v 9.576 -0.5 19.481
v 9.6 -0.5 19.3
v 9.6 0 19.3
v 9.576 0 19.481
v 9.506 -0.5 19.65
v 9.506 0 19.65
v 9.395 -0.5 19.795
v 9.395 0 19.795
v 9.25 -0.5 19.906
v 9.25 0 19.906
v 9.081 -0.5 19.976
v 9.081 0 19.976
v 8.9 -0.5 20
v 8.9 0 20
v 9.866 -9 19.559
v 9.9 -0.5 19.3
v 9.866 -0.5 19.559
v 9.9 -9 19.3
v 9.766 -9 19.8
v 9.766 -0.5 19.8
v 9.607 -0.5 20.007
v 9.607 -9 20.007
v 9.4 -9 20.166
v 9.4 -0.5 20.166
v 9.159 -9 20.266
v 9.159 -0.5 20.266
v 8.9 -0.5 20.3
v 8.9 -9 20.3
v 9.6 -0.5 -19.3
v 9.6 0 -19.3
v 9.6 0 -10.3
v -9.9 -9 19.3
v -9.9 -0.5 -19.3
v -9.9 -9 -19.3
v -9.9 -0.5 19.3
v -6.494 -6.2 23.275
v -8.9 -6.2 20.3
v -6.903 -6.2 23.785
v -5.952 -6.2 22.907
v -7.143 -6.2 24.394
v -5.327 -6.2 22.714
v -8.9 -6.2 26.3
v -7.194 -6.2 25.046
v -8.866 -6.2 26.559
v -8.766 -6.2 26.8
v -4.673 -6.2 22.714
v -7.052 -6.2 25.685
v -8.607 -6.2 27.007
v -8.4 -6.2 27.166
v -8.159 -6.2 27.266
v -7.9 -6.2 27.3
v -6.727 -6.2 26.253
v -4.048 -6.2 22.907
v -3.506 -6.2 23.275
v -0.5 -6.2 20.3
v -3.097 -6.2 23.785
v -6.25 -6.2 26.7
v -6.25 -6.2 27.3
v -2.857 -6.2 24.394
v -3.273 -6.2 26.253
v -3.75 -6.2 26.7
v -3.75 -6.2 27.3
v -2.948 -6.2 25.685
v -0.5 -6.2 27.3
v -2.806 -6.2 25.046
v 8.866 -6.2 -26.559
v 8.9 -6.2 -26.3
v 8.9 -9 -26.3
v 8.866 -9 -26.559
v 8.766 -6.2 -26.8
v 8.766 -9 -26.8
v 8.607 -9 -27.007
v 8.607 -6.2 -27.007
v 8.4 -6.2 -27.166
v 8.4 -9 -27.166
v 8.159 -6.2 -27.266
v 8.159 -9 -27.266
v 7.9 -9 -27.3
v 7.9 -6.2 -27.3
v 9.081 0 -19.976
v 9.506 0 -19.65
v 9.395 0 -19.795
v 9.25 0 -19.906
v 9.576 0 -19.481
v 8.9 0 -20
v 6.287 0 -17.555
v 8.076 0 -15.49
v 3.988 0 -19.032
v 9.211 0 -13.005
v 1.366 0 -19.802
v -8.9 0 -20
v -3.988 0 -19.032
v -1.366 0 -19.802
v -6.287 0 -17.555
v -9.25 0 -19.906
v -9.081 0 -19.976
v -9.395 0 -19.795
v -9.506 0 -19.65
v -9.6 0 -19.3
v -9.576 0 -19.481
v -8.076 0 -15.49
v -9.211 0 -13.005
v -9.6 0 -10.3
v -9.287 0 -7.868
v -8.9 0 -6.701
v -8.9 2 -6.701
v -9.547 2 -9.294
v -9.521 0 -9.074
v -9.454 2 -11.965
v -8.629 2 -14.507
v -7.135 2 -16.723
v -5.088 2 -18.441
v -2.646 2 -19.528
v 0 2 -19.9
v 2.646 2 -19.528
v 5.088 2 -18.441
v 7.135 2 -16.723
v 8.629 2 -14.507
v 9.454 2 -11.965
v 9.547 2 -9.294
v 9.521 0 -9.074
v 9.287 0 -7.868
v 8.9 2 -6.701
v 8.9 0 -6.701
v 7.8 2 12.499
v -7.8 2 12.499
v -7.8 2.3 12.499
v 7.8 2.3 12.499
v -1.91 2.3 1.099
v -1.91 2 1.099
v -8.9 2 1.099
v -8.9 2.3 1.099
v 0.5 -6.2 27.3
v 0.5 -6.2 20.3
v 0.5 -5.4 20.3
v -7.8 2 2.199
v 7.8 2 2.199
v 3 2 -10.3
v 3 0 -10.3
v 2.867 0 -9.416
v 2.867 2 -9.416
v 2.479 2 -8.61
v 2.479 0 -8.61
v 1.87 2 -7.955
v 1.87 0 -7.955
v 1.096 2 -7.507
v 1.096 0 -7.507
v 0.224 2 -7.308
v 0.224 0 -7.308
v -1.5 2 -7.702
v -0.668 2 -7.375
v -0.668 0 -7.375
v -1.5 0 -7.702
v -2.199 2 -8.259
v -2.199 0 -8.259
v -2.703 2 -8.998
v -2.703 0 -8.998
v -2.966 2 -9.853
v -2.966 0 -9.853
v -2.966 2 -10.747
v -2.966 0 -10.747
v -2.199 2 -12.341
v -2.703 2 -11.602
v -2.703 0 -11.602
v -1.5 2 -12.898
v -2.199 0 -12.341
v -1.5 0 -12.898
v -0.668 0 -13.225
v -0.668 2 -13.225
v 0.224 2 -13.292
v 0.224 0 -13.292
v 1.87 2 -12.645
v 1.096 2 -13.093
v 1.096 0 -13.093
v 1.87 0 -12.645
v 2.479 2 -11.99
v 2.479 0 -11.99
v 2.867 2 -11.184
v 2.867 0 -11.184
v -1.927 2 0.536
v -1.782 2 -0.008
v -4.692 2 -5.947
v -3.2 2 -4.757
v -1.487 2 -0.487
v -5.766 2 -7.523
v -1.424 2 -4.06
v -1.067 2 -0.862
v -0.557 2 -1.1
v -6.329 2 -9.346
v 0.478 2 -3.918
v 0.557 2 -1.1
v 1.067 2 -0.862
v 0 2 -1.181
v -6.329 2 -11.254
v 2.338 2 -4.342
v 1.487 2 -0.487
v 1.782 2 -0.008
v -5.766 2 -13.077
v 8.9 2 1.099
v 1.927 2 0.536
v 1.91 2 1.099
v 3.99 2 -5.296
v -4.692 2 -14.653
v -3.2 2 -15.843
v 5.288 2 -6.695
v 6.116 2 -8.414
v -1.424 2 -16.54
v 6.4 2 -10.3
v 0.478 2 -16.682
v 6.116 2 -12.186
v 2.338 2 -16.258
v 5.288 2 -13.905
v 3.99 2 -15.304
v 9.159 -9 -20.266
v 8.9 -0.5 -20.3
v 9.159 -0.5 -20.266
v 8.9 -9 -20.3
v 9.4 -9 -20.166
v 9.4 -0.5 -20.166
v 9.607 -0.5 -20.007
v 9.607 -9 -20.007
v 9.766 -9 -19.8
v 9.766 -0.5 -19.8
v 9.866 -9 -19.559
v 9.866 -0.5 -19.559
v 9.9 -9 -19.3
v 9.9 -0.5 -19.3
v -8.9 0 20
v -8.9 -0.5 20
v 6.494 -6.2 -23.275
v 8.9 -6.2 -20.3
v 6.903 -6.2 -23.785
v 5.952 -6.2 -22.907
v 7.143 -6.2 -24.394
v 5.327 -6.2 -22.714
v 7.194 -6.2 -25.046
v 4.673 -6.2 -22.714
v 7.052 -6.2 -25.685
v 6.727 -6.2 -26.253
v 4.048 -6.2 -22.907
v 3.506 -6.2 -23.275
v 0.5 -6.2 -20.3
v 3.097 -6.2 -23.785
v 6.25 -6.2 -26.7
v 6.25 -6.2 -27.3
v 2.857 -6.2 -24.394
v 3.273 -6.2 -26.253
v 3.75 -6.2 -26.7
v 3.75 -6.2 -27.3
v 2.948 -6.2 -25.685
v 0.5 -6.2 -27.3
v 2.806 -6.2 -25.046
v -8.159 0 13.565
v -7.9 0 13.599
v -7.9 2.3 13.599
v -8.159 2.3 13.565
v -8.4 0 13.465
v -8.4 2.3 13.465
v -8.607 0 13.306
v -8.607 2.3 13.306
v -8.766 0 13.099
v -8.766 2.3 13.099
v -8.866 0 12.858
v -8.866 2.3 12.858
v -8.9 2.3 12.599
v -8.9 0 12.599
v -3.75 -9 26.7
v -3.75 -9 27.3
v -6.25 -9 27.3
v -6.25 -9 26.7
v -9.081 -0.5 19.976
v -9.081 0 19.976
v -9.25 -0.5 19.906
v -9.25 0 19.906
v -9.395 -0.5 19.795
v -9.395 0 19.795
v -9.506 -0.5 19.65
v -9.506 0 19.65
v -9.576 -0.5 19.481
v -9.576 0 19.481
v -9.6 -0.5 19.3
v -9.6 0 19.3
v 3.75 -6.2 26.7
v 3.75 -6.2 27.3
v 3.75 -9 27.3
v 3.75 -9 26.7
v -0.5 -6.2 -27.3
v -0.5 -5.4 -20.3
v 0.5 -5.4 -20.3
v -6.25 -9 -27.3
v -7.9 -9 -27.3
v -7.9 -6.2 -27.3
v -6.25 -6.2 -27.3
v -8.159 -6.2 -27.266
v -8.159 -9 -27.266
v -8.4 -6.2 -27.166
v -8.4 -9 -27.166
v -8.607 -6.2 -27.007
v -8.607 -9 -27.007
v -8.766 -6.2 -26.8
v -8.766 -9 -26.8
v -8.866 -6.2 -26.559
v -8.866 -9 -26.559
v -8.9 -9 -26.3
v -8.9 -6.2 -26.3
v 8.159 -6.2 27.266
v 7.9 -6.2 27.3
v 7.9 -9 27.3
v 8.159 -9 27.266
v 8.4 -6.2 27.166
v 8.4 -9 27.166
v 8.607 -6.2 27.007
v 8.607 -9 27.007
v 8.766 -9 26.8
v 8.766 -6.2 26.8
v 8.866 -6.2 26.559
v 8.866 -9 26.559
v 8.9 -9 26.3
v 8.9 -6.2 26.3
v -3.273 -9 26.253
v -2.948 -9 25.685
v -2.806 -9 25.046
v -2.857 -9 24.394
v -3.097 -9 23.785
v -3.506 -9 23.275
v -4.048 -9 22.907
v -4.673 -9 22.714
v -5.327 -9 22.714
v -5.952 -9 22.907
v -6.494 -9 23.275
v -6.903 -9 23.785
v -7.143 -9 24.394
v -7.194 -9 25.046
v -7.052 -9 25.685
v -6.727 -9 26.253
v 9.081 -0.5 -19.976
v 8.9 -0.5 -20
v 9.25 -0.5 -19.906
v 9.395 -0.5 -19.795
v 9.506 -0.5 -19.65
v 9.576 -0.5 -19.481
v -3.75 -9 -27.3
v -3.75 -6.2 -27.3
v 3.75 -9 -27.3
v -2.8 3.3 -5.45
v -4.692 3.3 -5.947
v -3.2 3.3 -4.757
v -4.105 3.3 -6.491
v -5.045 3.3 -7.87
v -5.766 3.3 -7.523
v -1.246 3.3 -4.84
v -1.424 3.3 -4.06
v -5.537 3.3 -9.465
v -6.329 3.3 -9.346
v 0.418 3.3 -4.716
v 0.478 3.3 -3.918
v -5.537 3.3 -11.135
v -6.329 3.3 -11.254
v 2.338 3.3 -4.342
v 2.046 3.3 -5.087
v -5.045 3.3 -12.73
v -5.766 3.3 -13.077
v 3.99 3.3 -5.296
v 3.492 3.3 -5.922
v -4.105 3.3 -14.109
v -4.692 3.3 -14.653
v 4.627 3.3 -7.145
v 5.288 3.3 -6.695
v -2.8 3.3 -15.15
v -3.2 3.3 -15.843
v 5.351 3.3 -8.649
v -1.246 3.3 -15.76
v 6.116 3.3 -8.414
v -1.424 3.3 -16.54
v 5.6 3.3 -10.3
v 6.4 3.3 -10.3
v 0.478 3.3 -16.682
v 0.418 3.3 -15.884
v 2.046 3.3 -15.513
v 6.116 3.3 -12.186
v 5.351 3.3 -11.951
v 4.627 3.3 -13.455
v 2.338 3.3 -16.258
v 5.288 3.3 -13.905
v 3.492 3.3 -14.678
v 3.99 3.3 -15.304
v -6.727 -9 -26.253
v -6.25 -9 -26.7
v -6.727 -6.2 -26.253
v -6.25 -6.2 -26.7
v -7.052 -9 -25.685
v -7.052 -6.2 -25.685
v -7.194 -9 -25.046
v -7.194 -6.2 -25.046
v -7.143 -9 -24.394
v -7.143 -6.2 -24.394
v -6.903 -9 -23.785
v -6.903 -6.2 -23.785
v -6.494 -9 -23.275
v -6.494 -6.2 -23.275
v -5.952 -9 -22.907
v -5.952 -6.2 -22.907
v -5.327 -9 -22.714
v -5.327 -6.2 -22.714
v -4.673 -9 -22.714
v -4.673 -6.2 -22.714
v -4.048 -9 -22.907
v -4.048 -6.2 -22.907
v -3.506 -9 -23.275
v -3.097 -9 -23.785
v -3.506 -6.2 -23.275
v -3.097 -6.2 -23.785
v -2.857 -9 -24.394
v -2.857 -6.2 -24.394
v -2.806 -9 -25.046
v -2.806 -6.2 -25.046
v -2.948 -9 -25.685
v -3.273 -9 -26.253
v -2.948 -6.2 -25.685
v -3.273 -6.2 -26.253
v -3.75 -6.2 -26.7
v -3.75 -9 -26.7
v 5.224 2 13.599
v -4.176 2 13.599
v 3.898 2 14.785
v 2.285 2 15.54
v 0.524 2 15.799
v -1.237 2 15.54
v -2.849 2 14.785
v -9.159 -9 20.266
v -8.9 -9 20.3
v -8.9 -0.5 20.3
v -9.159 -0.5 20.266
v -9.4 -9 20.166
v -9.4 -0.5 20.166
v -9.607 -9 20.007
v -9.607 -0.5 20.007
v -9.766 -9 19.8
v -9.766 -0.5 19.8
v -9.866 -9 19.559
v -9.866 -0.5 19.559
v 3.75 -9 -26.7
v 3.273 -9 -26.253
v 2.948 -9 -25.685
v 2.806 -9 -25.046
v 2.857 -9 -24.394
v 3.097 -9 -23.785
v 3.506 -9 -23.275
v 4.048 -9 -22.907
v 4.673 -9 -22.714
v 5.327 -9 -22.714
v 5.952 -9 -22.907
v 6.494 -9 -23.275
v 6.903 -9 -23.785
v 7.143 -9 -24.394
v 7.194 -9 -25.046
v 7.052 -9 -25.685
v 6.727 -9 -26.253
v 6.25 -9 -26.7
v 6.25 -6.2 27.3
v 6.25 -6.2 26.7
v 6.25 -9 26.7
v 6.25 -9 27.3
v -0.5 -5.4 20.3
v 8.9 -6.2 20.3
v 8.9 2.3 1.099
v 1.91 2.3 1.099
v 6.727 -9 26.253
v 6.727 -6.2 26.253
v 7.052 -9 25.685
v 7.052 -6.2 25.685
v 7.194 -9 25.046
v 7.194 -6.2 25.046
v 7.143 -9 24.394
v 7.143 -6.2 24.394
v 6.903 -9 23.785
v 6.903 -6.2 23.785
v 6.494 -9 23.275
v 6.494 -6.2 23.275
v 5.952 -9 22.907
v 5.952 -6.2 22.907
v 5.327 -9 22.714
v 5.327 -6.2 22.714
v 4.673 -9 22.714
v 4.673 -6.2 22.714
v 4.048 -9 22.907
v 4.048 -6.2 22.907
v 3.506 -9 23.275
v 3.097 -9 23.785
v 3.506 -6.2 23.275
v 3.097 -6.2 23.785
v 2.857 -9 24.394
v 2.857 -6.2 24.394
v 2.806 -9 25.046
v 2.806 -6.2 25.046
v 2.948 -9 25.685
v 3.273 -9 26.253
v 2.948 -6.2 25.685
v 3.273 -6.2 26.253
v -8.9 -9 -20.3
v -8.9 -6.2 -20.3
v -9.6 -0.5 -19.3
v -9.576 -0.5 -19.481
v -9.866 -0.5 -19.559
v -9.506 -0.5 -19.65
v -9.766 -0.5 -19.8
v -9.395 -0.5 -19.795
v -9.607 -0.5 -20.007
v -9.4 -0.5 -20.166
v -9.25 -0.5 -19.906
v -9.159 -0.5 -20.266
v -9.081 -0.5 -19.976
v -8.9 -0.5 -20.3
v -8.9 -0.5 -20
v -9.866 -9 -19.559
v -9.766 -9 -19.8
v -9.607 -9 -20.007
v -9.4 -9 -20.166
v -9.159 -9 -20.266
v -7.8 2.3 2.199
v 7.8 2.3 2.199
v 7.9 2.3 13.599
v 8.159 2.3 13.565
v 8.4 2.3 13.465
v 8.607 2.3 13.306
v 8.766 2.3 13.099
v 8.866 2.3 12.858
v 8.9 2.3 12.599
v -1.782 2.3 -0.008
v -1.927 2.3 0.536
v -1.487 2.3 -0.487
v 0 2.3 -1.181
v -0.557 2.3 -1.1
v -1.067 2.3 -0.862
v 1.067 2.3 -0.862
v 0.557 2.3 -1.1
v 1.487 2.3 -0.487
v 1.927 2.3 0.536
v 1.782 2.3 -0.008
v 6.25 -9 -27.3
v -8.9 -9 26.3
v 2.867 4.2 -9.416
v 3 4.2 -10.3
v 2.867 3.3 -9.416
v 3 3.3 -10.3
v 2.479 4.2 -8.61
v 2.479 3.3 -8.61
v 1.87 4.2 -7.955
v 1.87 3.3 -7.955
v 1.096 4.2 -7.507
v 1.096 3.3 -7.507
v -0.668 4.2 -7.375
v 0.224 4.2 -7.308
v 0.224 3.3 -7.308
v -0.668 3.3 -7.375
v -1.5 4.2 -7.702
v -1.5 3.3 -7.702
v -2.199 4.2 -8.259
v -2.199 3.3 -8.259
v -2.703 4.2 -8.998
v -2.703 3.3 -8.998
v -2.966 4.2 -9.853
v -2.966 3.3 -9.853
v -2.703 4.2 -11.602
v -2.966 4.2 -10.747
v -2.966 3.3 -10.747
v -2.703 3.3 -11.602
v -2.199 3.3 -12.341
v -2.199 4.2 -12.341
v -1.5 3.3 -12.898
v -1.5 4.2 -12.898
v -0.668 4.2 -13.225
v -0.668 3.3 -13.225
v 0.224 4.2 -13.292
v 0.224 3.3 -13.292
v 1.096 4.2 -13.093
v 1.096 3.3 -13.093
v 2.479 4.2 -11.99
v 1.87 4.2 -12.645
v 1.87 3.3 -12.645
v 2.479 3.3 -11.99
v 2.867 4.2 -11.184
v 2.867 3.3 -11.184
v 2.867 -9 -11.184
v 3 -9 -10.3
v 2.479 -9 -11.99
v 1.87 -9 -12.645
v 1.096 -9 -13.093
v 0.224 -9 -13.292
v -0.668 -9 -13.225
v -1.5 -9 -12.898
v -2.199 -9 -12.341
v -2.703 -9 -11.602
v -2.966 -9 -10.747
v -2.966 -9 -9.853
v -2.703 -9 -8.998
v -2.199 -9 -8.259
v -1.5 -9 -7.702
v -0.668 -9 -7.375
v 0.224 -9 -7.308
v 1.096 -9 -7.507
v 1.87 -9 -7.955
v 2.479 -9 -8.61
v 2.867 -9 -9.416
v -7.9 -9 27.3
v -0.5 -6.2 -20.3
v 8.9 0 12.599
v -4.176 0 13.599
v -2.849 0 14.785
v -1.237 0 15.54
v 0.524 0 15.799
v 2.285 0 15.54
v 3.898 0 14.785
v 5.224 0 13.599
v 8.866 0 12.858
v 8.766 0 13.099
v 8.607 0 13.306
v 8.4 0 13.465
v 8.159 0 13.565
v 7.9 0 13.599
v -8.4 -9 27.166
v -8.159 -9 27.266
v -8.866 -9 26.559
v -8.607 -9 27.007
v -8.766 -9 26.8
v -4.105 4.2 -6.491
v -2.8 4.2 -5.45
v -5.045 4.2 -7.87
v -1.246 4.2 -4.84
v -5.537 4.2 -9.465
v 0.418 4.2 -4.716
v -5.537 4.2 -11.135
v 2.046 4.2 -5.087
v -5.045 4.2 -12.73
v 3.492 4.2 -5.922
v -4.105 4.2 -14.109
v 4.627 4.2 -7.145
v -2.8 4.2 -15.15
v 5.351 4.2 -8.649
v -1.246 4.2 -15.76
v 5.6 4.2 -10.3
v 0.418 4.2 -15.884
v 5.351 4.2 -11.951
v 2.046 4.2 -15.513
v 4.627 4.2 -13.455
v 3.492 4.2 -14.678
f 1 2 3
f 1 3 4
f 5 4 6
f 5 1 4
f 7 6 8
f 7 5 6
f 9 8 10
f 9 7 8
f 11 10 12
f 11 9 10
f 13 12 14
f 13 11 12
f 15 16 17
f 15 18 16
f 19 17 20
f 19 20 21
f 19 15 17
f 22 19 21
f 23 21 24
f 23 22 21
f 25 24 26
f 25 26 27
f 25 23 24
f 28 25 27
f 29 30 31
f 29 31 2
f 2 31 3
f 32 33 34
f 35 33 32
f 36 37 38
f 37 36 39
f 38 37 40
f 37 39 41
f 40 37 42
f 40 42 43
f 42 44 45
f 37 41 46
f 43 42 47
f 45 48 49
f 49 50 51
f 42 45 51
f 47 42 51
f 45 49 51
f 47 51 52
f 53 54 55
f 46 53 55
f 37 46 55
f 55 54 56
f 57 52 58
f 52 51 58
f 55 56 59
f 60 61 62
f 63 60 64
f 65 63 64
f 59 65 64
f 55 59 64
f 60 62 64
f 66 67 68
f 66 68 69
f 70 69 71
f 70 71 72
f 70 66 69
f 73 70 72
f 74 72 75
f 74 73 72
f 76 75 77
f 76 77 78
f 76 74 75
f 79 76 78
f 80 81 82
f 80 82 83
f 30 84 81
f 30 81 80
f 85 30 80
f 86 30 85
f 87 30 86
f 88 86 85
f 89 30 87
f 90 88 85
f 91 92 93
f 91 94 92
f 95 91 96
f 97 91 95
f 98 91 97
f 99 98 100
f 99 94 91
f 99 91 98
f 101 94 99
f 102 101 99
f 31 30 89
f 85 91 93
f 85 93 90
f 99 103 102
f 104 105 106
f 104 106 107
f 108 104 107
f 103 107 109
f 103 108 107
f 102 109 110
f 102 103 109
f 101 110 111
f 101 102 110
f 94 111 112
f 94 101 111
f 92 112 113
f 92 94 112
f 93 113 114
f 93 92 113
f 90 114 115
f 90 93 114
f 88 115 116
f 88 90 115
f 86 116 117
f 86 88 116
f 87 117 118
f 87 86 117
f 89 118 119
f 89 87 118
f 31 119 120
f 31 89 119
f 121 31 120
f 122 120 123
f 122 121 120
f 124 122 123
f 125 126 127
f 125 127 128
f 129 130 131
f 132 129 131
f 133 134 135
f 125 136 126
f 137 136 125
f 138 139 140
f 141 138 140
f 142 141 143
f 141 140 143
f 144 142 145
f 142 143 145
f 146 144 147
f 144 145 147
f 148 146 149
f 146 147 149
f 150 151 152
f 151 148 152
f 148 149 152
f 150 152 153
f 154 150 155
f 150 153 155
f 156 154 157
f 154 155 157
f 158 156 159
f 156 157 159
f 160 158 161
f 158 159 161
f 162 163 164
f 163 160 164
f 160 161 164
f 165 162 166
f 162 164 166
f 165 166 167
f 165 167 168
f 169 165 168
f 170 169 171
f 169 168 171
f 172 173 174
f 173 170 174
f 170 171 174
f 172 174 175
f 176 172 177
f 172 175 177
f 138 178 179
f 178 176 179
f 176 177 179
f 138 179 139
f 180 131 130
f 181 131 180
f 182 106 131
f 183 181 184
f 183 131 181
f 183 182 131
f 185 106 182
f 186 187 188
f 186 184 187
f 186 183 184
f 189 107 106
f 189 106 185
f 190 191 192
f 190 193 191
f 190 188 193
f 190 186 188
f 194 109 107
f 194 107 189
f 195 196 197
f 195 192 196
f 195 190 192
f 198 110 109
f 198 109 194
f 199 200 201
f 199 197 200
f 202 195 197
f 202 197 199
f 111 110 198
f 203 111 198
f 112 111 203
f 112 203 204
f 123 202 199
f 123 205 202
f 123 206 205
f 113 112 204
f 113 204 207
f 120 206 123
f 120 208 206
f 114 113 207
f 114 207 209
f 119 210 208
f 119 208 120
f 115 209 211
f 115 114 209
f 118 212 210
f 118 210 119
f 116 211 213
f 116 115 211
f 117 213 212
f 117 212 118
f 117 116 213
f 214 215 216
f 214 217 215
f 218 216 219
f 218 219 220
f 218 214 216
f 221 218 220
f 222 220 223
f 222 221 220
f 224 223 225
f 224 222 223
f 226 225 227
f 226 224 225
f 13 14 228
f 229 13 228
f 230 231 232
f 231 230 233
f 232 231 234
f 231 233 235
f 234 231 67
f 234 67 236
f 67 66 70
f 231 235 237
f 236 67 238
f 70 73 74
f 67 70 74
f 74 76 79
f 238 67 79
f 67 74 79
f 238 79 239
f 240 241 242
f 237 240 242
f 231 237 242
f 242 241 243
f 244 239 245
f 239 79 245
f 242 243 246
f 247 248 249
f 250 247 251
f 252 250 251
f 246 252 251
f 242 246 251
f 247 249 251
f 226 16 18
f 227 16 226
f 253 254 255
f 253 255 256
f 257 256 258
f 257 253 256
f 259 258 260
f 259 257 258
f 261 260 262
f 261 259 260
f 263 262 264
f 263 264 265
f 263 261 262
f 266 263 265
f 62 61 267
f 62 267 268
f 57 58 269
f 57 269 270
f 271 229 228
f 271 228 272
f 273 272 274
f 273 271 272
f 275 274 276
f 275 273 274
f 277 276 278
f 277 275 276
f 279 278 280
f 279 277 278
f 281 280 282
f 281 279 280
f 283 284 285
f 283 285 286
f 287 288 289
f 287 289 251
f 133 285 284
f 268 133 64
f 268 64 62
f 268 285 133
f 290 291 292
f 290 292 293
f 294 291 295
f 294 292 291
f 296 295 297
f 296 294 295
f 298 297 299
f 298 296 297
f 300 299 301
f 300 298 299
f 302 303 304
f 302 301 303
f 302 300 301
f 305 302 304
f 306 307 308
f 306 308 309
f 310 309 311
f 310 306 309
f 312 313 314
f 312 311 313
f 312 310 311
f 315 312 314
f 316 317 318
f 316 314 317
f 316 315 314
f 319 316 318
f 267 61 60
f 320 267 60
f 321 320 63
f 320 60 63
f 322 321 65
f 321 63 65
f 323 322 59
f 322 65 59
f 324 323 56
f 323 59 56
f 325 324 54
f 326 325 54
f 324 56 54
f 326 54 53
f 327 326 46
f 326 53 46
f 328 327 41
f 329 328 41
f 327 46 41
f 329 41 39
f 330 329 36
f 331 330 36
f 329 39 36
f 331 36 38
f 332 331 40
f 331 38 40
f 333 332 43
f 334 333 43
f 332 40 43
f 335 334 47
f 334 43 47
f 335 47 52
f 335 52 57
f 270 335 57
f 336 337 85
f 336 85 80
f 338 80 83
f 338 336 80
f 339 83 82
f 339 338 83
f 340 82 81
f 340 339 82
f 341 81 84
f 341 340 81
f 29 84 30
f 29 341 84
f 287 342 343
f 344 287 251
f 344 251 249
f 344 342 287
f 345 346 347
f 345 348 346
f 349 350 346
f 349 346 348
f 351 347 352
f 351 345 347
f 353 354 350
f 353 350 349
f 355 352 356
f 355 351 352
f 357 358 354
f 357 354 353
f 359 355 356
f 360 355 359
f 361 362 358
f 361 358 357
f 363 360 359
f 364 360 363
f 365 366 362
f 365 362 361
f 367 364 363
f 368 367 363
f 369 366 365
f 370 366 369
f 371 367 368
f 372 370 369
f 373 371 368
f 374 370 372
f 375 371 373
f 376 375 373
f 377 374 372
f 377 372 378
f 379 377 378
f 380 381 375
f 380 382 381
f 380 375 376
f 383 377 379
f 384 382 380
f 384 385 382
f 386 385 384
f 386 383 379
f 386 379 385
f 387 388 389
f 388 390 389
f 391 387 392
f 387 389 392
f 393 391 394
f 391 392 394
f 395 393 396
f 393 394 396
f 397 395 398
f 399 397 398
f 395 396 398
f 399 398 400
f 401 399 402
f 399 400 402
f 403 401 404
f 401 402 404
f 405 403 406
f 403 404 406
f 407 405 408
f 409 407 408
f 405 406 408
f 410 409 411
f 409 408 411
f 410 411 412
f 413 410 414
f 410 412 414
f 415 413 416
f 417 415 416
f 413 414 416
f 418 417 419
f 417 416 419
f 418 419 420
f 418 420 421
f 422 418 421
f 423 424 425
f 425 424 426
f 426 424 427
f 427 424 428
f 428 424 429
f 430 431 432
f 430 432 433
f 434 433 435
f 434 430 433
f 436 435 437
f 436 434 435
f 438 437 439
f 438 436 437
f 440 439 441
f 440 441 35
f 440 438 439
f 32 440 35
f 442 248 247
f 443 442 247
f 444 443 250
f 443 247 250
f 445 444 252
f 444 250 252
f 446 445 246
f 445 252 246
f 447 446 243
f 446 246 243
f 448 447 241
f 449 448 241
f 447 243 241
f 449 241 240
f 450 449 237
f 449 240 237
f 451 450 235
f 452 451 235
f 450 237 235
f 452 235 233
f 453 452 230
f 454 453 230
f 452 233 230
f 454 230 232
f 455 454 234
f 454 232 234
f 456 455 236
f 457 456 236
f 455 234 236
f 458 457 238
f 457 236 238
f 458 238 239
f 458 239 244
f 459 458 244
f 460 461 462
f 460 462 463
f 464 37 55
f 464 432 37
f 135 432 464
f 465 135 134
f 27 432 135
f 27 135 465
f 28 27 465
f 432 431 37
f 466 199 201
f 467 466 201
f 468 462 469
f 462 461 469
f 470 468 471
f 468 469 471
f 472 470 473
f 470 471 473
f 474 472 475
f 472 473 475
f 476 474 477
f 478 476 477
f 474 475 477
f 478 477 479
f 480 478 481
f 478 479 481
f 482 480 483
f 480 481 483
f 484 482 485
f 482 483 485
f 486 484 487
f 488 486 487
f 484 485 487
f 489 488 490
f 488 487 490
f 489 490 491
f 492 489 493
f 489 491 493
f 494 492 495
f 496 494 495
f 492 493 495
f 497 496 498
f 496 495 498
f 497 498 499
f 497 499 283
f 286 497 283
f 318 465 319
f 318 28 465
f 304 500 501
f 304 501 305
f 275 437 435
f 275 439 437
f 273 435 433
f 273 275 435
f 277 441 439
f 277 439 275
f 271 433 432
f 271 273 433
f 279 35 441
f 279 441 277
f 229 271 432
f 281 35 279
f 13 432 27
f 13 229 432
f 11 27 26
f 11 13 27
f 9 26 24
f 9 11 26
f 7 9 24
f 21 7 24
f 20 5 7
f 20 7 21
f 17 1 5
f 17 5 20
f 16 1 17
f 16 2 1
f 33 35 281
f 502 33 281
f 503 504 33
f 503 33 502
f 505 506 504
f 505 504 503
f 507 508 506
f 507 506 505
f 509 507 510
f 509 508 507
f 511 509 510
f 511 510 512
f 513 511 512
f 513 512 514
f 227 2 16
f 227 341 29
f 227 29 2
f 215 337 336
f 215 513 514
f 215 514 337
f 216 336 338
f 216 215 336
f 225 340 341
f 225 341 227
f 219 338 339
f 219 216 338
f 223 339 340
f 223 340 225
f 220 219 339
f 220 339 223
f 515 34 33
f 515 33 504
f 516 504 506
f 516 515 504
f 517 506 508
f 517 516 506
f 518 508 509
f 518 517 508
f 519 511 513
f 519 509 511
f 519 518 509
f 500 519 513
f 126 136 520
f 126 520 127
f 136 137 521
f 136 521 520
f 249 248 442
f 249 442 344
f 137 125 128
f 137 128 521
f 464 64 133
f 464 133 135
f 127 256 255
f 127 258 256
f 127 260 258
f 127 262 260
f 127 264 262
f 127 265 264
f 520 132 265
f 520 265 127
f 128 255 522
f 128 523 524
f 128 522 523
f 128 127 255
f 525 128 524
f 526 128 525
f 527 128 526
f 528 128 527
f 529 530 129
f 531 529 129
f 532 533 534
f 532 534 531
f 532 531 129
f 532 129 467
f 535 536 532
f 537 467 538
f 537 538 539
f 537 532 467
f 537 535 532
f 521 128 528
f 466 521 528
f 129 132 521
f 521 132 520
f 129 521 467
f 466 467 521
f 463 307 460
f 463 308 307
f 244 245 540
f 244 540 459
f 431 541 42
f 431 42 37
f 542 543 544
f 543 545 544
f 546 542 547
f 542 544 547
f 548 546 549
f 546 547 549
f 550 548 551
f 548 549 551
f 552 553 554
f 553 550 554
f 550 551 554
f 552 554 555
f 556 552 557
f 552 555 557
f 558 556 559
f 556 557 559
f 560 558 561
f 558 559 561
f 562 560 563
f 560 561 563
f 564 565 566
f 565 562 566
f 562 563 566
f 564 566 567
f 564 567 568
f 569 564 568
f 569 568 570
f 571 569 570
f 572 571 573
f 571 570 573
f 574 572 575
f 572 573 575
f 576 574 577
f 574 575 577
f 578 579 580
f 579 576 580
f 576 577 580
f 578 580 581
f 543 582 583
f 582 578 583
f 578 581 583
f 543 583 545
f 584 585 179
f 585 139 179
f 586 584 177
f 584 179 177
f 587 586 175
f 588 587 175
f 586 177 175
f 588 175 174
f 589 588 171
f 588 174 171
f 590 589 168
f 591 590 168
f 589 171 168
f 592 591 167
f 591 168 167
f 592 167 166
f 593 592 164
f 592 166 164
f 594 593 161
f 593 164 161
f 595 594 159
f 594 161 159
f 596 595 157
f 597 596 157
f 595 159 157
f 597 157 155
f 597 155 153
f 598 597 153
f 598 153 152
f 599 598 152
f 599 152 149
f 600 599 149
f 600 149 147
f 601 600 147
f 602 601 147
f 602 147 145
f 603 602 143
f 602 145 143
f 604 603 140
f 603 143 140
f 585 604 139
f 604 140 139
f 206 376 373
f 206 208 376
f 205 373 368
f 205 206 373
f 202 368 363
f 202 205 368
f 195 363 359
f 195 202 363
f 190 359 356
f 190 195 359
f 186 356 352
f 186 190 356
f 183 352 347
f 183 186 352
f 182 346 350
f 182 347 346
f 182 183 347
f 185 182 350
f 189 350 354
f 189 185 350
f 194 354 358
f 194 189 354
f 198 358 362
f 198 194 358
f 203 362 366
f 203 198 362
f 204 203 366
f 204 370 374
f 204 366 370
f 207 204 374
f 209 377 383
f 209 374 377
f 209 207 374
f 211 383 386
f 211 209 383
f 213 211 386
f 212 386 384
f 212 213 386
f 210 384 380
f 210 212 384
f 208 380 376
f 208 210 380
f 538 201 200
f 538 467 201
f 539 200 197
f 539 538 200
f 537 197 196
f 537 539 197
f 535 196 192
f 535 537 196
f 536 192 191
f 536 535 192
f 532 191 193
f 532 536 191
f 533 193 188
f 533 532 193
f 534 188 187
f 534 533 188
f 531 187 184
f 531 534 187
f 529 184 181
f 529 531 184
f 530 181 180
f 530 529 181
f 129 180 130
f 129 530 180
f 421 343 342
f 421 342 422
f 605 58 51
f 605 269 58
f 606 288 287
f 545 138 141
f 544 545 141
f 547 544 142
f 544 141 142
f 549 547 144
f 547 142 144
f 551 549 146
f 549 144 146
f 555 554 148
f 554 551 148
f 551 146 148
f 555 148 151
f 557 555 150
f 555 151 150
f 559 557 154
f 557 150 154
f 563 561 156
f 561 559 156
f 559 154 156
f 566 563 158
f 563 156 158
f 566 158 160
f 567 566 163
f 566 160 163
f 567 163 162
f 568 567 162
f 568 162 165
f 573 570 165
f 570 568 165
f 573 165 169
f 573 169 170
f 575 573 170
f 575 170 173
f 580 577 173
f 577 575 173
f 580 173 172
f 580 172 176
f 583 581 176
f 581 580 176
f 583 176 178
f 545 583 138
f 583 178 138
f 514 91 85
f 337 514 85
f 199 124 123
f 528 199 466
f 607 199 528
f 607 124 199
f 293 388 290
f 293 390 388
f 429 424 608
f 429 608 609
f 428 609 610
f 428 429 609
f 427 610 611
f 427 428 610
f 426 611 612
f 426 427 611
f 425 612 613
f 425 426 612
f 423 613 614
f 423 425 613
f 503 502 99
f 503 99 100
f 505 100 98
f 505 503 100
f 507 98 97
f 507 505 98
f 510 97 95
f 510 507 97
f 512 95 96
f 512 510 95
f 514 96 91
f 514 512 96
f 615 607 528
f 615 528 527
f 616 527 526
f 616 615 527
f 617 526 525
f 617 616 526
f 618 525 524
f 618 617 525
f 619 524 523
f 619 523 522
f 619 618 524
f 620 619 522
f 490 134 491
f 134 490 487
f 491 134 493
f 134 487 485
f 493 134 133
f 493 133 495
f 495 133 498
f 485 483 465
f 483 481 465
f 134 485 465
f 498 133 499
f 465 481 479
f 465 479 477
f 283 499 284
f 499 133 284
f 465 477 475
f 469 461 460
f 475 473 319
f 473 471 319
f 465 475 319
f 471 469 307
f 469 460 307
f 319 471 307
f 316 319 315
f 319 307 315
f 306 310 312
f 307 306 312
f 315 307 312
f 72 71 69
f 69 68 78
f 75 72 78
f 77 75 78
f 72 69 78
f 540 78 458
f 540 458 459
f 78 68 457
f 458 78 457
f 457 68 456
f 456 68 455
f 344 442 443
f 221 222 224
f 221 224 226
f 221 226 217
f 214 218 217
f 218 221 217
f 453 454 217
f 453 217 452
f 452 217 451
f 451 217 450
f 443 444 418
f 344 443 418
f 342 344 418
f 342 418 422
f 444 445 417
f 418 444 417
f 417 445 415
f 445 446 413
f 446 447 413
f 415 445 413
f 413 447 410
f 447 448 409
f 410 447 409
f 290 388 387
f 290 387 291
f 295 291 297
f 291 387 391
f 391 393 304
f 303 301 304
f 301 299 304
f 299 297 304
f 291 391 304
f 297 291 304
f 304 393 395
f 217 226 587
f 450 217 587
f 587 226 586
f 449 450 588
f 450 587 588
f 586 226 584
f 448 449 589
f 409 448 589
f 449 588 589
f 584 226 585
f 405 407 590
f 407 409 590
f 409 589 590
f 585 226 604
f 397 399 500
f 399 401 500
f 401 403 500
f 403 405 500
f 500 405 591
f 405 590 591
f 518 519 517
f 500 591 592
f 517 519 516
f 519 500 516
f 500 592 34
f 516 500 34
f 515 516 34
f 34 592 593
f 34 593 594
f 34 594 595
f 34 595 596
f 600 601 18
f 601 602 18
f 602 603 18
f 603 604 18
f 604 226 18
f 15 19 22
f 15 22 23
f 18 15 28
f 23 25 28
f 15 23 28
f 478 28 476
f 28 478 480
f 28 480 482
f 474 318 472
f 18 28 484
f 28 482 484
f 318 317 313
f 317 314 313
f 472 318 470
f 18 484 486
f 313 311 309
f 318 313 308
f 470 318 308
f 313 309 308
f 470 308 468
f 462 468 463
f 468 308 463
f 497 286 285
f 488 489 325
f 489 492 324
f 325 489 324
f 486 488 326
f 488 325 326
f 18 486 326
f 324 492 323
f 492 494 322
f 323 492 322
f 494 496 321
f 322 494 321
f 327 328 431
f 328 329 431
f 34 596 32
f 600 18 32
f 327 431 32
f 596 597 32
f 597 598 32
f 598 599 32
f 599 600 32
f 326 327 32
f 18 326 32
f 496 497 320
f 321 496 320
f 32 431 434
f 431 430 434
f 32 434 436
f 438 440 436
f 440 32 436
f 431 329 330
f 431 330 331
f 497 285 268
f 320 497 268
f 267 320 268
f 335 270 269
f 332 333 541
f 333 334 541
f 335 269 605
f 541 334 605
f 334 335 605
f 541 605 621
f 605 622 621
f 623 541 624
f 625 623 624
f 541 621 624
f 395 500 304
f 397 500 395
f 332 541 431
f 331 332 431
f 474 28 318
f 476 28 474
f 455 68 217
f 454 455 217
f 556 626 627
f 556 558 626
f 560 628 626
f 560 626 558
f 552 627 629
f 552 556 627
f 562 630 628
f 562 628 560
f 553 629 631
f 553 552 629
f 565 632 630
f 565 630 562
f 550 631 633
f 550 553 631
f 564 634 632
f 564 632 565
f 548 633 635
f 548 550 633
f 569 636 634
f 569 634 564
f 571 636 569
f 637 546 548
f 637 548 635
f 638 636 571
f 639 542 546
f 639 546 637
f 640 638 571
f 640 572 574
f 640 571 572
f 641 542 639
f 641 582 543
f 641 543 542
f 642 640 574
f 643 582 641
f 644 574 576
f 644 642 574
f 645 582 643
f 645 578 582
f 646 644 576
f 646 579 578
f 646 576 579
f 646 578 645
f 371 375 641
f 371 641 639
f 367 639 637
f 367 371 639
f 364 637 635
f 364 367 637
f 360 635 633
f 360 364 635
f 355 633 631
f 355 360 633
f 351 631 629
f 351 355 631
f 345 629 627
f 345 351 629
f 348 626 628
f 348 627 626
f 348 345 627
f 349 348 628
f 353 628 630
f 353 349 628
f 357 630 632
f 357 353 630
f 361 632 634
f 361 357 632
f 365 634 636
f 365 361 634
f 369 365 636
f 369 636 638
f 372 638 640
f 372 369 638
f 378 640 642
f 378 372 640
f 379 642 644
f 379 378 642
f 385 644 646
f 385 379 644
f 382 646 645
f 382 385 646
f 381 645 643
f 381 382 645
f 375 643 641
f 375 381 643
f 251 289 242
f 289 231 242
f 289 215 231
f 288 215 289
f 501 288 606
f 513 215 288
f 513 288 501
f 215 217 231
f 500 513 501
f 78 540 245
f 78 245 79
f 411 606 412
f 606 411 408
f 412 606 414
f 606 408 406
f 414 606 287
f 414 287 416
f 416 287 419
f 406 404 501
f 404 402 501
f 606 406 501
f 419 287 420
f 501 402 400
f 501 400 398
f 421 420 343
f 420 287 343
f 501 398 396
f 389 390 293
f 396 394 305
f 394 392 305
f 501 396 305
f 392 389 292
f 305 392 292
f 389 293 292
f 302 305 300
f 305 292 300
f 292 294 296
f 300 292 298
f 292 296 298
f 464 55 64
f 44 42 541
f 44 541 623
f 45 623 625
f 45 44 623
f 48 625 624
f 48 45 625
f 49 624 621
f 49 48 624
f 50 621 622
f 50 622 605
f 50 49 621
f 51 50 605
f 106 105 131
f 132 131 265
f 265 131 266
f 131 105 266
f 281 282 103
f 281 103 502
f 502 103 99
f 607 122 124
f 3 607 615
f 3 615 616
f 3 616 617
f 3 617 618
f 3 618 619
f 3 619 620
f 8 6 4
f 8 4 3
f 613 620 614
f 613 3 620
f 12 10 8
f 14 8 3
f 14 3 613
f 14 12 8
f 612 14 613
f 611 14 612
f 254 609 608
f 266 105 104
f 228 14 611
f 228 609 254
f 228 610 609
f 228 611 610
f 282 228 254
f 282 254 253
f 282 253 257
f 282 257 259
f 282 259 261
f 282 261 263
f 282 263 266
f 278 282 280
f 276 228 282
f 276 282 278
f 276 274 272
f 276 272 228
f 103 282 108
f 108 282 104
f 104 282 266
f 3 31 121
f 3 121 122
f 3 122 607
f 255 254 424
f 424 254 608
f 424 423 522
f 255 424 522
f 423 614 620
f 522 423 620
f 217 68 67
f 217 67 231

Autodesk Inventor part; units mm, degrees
ref_plane "YZ Plane" through (0, 0, 0) normal (1, 0, 0) x (0, 1, 0)
ref_plane "XZ Plane" through (0, 0, 0) normal (0, 1, 0) x (-1, 0, 0)
ref_plane "XY Plane" through (0, 0, 0) normal (0, 0, 1) x (1, 0, 0)
sketch "Boceto1" plane through (0, 0, 0) normal (0, 1, 0) x (-1, 0, 0)
  line L0 (9.9, 20.3) -> (-9.9, 20.3)
  line L1 (-9.9, 20.3) -> (-9.9, -20.3)
  line L2 (-9.9, -20.3) -> (9.9, -20.3)
  line L3 (9.9, -20.3) -> (9.9, 20.3)
  line L4 (9.9, 20.3) -> (-9.9, -20.3) construction
  line L5 (-9.9, 20.3) -> (9.9, -20.3) construction
  point P0 (0, 0)
  dimension "d0" = 19.8
  dimension "d1" = 40.6
extrude "Extrusión1" add sketch "Boceto1" against normal blind 9
sketch "Boceto2" plane through (0, 0, 0) normal (0, 1, 0) x (1, 0, 0)
  circle A0 centre (0, 10.3) radius 3
  line L0 (9.9, 20.3) -> (-9.9, 20.3) projected
  point P0 (0, 0)
  dimension "d4" = 6
  dimension "d5" = 10
extrude "Extrusión2" cut sketch "Boceto2" against normal through all
sketch "Boceto5" plane through (0, -9, 0) normal (0, -1, 0) x (1, 0, 0)
  line L0 (-8.9, 20.3) -> (8.9, 20.3)
  line L1 (8.9, 20.3) -> (8.9, 27.3)
  line L2 (8.9, 27.3) -> (-8.9, 27.3)
  line L3 (-8.9, 27.3) -> (-8.9, 20.3)
  line L4 (-8.9, 20.3) -> (8.9, 27.3) construction
  line L5 (8.9, 20.3) -> (-8.9, 27.3) construction
  line L6 (-9.9, 27.3) -> (9.9, 27.3)
  line L7 (9.9, 20.3) -> (-9.9, 20.3) projected
  point P0 (0, 0)
  point P1 (0, 0)
  point P2 (0, 23.8)
  dimension "d23" = 17.8
  dimension "d24" = 7
extrude "Extrusión5" add sketch "Boceto5" against normal blind 2.8
sketch "Boceto6" plane through (0, -6.2, 0) normal (0, 1, 0) x (1, 0, 0)
  arc A0 (-3.75, -26.7004) -> (-6.25, -26.7004) centre (-5, -24.89) ccw
  line L0 (-8.9, -27.3) -> (8.9, -27.3)
  line L1 (-3.75, -27.3) -> (-6.25, -27.3)
  line L2 (-6.25, -27.3) -> (-6.25, -26.7)
  line L3 (-3.75, -26.7) -> (-3.75, -27.3)
  line L4 (0, -27.3) -> (0, -23.9124)
  line L5 (-8.9, -20.3) -> (-8.9, -27.3)
  line L6 (-8.9, -20.3) -> (8.9, -20.3) projected
  line L7 (-8.3229, -20.3) -> (8.9, -20.3)
  line L8 (8.9, -20.3) -> (8.9, -27.3)
  point P0 (0, 0)
  point P1 (0, 0)
  dimension "d27" = 4.4
  dimension "d28" = 2.41
  dimension "d29" = 5
  dimension "d30" = 2.65
  dimension "d31" = 0.6
extrude "Extrusión6" cut sketch "Boceto6" against normal through all contours L3 L0 L2 A0
sketch "Boceto8" plane through (0, 0, 0) normal (1, 0, 0) x (0, 1, 0)
  line L0 (-6.2, 27.3) -> (-5.4, 20.3)
  line L1 (-5.4, 20.3) -> (-6.2, 20.3)
  line L2 (-6.2, 20.3) -> (-6.2, 27.3)
  point P0 (0, 0)
  dimension "d34" = 0.8
extrude "Extrusión7" add sketch "Boceto8" along normal mid plane 1
mirror "Simetría3" about plane through (0, 0, 0) normal (1, 0, 0) of "Extrusión6"
mirror "Simetría4" about plane through (0, 0, 0) normal (0, 0, 1) of "Extrusión5", "Extrusión6", "Simetría3", "Extrusión7"
sketch "Boceto9" plane through (0, 0, 0) normal (0, 1, 0) x (1, 0, 0)
  circle A0 centre (0, 10.3) radius 3 projected
  line L0 (-8.9, -13.5986) -> (8.9, -13.5986)
  line L1 (8.9, -13.5986) -> (8.9, 6.7014)
  line L2 (-8.9, 6.7014) -> (-8.9, -13.5986)
  line L3 (-8.9, -13.5986) -> (5.885, 8.9919) construction
  line L4 (8.9, -13.5986) -> (-5.885, 8.9919) construction
  arc A1 (8.9, 6.7014) -> (-8.9, 6.7014) centre (0, 10.3) ccw
  line L5 (9.9, 20.3) -> (-9.9, 20.3) projected
  point P0 (0, 0)
  dimension "d40" = 9.6
  dimension "d42" = 20.3
  dimension "d61" = 17.8
extrude "Extrusión8" add sketch "Boceto9" along normal blind 2
sketch "Boceto11" plane through (0, 2, 0) normal (0, 1, 0) x (1, 0, 0)
  line L0 (-8.9, -13.5986) -> (8.9, -13.5986) projected
  line L1 (5.2244, -15.7986) -> (5.2244, -13.5986)
  arc A0 (-4.1756, -13.5986) -> (5.2244, -13.5986) centre (0.5244, -9.6782) ccw
  line L2 (-4.1756, -13.5986) -> (5.2244, -13.5986)
  point P0 (0, 0)
  dimension "d50" = 2.2
  dimension "d51" = 9.4
extrude "Extrusión9" add sketch "Boceto11" against normal blind 2
sketch "Boceto12" plane through (0, 2, 0) normal (0, 1, 0) x (1, 0, 0)
  circle A0 centre (0, 10.3) radius 6.4
  circle A1 centre (0, 10.3) radius 3 projected
  point P0 (0, 0)
  dimension "d54" = 12.8
extrude "Extrusión10" add sketch "Boceto12" along normal blind 1.3
sketch "Boceto13" plane through (0, 3.3, -10.3) normal (0, 1, 0) x (1, 0, 0)
  circle A0 centre (0, 0) radius 5.6
  circle A1 centre (0, 0) radius 3 projected
  point P0 (0, -10.3)
  dimension "d57" = 11.2
extrude "Extrusión11" add sketch "Boceto13" along normal blind 0.9
sketch "Boceto15" plane through (0, 2, 0) normal (0, 1, 0) x (1, 0, 0)
  line L0 (8.9, 6.7014) -> (8.9, -13.5986) projected
  line L1 (-8.9, -13.5986) -> (8.9, -13.5986)
  line L2 (8.9, -13.5986) -> (8.9, -1.0986)
  line L3 (8.9, -1.0986) -> (-8.9, -1.0986)
  line L4 (-8.9, -1.0986) -> (-8.9, -13.5986)
  line L5 (-8.9, -13.5986) -> (8.9, -1.0986) construction
  line L6 (8.9, -13.5986) -> (-8.9, -1.0986) construction
  line L7 (-8.9, -13.5986) -> (-4.1756, -13.5986) projected
  line L8 (-7.8, -12.4986) -> (7.8, -12.4986)
  line L9 (7.8, -12.4986) -> (7.8, -2.1986)
  line L10 (7.8, -2.1986) -> (-7.8, -2.1986)
  line L11 (-7.8, -2.1986) -> (-7.8, -12.4986)
  point P0 (0, 0)
  point P1 (0, -7.3486)
  dimension "d62" = 12.5
  dimension "d63" = 1.1
extrude "Extrusión12" add sketch "Boceto15" along normal blind 0.3
sketch "Boceto16" plane through (0, 2.3, 0) normal (0, 1, 0) x (1, 0, 0)
  arc A0 (1.91, -1.0986) -> (-1.91, -1.0986) centre (0, -0.7586) ccw
  line L0 (-7.8, -2.1986) -> (7.8, -2.1986) projected
  line L1 (8.9, -1.0986) -> (-8.9, -1.0986) projected
  point P0 (0, 0)
  dimension "d66" = 3.88
  dimension "d67" = 1.44
extrude "Extrusión13" add sketch "Boceto16" against normal blind 0.3
sketch "Boceto17" plane through (0, 0, 0) normal (0, 1, 0) x (1, 0, 0)
  line L0 (-9.9, 20.3) -> (-9.9, -20.3) projected
  line L1 (9.9, -20.3) -> (9.9, 20.3) projected
  line L2 (-9.9, -20.3) -> (9.9, -20.3) projected
  line L3 (9.9, 20.3) -> (-9.9, 20.3) projected
  line L4 (-9.6, -20) -> (-9.6, 20)
  line L5 (-9.6, 20) -> (9.6, 20)
  line L6 (9.6, 20) -> (9.6, -20)
  line L7 (9.6, -20) -> (-9.6, -20)
  point P0 (0, 0)
  dimension "d70" = 0.3
extrude "Extrusión14" cut sketch "Boceto17" against normal blind 0.5
fillet "Empalme1" radius 1 10 edges at (9.9, -4.75, 20.3) (8.9, -7.6, 27.3) (-8.9, -7.6, 27.3) (-9.9, -4.75, 20.3) (8.9, 1.15, 13.5986) (-8.9, 1.15, 13.5986) (9.9, -4.75, -20.3) (-9.9, -4.75, -20.3) (-8.9, -7.6, -27.3) (8.9, -7.6, -27.3)
fillet "Empalme2" radius 0.7 4 edges at (9.6, -0.25, 20) (-9.6, -0.25, 20) (9.6, -0.25, -20) (-9.6, -0.25, -20)
sketch "Boceto18" plane through (0, 2, 0) normal (0, 1, 0) x (1, 0, 0)
  point P0 (0, 0)
properties part number "Top" material "Plástico ABS"
